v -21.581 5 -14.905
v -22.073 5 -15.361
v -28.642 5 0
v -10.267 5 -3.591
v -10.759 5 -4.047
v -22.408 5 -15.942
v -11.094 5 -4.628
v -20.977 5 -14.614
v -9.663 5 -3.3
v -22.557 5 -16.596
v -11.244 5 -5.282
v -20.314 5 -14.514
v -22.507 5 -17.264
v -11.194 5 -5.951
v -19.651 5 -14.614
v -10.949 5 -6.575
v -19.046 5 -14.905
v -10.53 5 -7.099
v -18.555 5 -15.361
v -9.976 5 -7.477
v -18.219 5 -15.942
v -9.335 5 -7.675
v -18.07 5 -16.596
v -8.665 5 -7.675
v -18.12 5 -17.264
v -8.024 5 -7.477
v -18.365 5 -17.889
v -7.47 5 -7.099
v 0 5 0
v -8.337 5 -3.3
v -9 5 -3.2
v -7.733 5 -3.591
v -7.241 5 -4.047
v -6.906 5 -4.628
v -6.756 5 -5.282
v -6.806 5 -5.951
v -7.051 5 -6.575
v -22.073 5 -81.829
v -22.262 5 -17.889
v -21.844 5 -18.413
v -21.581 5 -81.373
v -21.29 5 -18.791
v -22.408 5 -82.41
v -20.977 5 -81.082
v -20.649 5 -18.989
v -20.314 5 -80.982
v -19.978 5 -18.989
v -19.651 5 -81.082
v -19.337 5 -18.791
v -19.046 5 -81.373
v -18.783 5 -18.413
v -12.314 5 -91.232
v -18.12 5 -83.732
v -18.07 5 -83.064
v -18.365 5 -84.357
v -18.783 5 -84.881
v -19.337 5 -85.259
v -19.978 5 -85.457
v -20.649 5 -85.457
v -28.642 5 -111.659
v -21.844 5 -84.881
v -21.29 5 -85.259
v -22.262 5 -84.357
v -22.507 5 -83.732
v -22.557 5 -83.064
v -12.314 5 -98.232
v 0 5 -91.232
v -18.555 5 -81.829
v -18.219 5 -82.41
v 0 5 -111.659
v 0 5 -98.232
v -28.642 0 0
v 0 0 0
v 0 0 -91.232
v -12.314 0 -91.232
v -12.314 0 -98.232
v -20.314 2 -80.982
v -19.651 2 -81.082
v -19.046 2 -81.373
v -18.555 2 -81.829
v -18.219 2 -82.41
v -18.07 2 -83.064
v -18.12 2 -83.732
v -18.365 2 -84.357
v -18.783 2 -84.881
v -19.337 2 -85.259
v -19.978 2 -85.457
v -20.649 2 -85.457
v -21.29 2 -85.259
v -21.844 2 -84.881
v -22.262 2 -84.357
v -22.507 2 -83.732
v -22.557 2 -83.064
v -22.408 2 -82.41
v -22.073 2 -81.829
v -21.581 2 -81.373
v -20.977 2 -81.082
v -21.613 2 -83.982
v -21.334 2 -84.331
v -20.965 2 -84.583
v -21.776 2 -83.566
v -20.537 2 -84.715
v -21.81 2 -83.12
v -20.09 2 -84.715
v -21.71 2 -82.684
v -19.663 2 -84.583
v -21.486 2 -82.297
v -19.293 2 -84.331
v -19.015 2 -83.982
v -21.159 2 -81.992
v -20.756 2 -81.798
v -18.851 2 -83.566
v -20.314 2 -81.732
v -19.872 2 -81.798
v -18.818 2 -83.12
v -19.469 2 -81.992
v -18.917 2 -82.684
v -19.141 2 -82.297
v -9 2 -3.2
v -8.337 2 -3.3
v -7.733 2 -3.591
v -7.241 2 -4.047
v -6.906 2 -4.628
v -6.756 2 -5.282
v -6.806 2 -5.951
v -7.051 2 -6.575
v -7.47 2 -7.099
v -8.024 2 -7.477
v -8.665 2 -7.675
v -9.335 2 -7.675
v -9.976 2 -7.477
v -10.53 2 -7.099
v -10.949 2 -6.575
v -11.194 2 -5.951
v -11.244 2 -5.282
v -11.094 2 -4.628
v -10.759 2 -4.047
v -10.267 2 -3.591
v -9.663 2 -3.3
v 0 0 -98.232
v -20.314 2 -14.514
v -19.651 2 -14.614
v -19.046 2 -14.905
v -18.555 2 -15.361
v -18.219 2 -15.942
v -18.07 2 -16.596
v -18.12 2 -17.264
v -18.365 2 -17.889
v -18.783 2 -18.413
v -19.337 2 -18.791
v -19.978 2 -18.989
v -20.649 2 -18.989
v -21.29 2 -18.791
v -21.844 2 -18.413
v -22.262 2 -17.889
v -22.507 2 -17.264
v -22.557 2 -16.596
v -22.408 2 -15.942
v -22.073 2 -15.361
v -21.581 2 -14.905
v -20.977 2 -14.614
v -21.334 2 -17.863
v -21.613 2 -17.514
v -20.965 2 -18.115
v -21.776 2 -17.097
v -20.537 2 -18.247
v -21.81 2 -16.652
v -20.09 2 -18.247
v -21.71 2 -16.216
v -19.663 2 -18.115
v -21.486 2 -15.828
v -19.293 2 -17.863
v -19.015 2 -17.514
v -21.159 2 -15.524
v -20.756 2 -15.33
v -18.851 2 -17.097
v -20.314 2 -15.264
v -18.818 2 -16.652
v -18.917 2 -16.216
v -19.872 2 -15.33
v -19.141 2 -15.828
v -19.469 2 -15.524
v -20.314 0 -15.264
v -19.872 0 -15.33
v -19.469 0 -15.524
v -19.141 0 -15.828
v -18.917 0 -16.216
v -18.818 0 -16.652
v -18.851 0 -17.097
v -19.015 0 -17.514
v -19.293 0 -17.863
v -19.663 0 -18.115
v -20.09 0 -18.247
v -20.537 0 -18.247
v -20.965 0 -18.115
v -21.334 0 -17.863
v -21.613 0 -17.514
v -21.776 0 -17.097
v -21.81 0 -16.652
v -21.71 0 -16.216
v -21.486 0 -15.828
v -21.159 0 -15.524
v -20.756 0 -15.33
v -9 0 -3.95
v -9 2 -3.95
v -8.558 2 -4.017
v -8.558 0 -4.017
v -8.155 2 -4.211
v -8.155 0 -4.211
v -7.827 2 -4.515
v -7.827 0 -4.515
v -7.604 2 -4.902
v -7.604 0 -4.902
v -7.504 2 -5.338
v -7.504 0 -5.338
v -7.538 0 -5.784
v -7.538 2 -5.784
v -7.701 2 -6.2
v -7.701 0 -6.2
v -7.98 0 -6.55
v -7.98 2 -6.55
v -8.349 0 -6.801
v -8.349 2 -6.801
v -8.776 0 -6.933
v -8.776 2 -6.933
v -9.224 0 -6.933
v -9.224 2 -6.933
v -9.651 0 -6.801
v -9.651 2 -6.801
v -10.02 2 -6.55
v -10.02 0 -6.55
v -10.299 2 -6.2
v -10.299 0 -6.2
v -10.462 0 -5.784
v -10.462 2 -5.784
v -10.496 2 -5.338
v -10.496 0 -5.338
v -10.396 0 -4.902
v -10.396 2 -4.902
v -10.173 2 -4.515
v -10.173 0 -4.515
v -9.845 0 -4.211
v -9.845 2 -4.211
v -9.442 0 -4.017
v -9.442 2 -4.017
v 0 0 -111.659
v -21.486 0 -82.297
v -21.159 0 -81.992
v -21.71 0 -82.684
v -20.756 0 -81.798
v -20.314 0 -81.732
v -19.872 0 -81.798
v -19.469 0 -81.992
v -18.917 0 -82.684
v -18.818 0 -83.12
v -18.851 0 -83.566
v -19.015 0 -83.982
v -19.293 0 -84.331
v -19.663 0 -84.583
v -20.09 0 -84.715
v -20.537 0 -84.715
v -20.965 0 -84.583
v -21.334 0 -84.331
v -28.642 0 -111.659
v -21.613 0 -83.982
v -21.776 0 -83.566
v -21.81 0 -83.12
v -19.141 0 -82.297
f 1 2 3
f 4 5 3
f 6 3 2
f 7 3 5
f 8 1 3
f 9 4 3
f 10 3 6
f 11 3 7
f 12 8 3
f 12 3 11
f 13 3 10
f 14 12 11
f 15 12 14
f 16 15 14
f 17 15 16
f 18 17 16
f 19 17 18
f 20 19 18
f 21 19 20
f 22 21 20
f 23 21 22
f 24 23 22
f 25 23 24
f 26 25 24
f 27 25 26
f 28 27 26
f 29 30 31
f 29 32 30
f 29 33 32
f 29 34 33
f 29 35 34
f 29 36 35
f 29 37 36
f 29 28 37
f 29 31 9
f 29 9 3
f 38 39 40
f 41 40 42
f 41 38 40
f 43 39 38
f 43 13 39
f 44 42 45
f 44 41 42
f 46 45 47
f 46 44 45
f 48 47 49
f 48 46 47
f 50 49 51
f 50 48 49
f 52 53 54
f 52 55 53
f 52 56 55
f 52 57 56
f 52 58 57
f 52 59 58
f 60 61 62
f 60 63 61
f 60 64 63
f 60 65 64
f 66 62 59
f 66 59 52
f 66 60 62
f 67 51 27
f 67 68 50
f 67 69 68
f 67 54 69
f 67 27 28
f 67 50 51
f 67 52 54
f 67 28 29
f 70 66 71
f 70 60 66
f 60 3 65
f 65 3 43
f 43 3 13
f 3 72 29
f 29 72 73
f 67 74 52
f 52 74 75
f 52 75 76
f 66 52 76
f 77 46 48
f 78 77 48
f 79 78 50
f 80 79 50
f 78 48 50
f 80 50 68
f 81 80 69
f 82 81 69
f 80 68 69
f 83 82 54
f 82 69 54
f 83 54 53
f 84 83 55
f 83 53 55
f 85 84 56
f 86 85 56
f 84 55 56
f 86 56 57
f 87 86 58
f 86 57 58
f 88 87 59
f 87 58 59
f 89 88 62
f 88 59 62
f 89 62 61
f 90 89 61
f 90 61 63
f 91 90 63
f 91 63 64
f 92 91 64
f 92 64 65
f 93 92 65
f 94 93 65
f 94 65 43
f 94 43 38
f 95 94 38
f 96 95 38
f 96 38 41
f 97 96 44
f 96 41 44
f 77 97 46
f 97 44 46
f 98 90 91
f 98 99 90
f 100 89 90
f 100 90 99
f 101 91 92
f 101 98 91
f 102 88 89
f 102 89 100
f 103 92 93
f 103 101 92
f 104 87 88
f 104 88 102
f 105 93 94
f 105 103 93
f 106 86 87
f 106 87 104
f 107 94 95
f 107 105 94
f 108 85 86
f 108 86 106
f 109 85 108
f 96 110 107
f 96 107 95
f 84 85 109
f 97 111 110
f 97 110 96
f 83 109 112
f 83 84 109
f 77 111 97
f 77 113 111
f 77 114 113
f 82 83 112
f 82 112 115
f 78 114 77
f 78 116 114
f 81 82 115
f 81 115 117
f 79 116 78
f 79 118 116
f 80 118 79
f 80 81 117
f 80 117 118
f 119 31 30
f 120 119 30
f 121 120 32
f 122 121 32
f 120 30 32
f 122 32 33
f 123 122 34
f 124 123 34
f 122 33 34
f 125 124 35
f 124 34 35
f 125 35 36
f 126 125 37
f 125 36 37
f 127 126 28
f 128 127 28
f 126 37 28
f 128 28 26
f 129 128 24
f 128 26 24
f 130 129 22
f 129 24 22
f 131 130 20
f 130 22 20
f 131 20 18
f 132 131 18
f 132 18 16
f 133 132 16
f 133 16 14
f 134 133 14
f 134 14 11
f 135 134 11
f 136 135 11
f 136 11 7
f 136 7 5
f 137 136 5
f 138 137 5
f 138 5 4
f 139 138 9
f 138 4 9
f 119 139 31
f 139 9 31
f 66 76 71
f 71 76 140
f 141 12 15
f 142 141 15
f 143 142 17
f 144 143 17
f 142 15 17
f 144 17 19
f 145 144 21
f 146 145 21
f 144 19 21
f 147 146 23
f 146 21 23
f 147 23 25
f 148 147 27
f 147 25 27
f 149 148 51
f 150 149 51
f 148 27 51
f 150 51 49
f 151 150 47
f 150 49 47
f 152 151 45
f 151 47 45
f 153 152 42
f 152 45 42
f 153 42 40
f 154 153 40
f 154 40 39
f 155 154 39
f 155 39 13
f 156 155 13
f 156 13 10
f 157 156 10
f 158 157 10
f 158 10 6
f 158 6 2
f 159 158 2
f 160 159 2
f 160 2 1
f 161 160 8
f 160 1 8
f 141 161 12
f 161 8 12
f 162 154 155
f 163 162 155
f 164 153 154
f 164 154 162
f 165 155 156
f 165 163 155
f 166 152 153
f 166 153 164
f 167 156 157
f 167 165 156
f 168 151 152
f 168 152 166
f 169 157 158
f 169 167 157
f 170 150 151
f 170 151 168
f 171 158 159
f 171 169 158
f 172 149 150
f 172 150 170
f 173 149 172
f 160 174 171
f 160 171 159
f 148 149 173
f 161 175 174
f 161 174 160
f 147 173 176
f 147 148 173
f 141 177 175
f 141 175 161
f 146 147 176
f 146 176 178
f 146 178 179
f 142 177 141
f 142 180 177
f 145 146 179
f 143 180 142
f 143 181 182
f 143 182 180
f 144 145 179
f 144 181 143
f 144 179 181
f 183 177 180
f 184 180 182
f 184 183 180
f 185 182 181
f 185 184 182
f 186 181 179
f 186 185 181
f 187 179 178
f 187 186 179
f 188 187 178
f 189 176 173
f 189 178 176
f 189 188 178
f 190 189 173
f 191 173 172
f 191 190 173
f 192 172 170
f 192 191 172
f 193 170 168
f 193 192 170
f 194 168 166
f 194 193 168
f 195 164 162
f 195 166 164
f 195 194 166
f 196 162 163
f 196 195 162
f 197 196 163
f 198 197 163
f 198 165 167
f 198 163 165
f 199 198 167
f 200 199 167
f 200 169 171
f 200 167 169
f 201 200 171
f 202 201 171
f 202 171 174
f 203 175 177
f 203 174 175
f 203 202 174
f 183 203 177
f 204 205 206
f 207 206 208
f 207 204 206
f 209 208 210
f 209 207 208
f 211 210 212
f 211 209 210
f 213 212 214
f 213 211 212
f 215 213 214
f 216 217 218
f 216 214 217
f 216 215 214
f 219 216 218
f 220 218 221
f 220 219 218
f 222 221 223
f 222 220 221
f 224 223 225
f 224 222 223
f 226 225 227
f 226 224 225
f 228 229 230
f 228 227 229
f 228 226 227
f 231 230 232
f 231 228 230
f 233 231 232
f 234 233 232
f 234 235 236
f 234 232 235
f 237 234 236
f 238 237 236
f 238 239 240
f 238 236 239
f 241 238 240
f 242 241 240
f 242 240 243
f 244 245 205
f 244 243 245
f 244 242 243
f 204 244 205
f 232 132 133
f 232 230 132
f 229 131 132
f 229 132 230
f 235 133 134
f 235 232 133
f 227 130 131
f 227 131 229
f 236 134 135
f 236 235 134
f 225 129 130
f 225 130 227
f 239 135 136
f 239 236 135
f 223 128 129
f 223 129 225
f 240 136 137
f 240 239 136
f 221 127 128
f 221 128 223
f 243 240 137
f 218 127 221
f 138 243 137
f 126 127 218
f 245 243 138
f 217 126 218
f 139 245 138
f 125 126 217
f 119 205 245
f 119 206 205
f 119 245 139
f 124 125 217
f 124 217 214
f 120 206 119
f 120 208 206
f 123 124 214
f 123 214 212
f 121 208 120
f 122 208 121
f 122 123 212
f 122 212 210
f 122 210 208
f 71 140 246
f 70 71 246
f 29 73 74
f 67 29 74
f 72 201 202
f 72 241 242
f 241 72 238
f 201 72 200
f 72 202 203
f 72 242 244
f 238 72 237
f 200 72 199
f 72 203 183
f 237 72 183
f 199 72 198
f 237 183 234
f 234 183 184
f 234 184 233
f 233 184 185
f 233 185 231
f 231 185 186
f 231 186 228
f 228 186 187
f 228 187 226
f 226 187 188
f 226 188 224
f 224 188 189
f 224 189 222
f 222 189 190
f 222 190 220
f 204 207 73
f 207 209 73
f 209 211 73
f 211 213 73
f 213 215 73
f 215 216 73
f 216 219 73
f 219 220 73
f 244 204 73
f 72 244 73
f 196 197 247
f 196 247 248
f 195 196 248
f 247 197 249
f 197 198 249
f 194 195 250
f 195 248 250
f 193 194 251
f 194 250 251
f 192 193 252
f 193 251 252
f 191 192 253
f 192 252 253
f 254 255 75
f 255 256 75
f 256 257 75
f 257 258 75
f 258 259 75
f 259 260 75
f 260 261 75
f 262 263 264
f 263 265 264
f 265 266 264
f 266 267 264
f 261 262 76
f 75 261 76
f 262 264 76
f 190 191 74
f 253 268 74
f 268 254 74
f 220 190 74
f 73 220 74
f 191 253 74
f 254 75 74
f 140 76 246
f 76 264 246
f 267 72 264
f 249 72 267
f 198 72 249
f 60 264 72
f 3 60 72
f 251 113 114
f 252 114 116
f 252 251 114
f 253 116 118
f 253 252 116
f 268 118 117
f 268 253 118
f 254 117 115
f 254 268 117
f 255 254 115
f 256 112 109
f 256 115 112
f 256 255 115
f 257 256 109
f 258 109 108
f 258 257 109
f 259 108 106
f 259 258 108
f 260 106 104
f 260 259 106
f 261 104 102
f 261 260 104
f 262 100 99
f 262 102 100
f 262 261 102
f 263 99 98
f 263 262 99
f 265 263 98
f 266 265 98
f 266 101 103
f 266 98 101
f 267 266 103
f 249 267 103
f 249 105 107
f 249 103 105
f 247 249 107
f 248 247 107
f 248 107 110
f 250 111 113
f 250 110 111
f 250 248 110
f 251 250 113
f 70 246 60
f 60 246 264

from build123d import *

# Parameters (mm, degrees)
EXTRUDE_1_DEPTH     = 5
SKETCH_1_12_R       = 1.5
CUT_EXTRUDE_1_DEPTH = 116.382644488
CUT_EXTRUDE_START   = 5
SKETCH_1_13_R       = 2.25
CUT_EXTRUDE_3_DEPTH = 3


with BuildPart() as part:
    # 草图1 → 凸台-拉伸1 (new body)
    with BuildSketch(Plane(origin=(0, 0, 0), x_dir=(1, 0, 0), z_dir=(0, 1, 0))):
        Polygon((-28.642135833, 0), (0, 0), (0, 91.231745931), (-12.313708499, 91.231745931), (-12.313708499, 98.231745931), (0, 98.231745931), (0, 111.65922579), (-28.642135833, 111.65922579), align=None)
    extrude(amount=EXTRUDE_1_DEPTH)

    # 草图1<12> → 切除-拉伸1 (cut, through all)
    with BuildSketch(Plane(origin=(0, 0, 0), x_dir=(1, 0, 0), z_dir=(0, 1, 0))):
        with Locations(Location((-20.313708499, 83.231745931, 0), (0, 0, 270))):
            Circle(SKETCH_1_12_R)
        with Locations(Location((-20.313708499, 16.763708499, 0), (0, 0, 270))):
            Circle(SKETCH_1_12_R)
        with Locations(Location((-9, 5.45, 0), (0, 0, 270))):
            Circle(SKETCH_1_12_R)
    extrude(amount=CUT_EXTRUDE_1_DEPTH, mode=Mode.SUBTRACT)

    # 草图1<13> → 切除-拉伸3 (cut)
    with BuildSketch(Plane(origin=(0, 0, 0), x_dir=(1, 0, 0), z_dir=(0, 1, 0)).offset(CUT_EXTRUDE_START)):
        with Locations(Location((-20.313708499, 83.231745931, 0), (0, 0, 270))):
            Circle(SKETCH_1_13_R)
        with Locations(Location((-9, 5.45, 0), (0, 0, 270))):
            Circle(SKETCH_1_13_R)
        with Locations(Location((-20.313708499, 16.763708499, 0), (0, 0, 270))):
            Circle(SKETCH_1_13_R)
    extrude(amount=-CUT_EXTRUDE_3_DEPTH, mode=Mode.SUBTRACT)


solid = part.part
